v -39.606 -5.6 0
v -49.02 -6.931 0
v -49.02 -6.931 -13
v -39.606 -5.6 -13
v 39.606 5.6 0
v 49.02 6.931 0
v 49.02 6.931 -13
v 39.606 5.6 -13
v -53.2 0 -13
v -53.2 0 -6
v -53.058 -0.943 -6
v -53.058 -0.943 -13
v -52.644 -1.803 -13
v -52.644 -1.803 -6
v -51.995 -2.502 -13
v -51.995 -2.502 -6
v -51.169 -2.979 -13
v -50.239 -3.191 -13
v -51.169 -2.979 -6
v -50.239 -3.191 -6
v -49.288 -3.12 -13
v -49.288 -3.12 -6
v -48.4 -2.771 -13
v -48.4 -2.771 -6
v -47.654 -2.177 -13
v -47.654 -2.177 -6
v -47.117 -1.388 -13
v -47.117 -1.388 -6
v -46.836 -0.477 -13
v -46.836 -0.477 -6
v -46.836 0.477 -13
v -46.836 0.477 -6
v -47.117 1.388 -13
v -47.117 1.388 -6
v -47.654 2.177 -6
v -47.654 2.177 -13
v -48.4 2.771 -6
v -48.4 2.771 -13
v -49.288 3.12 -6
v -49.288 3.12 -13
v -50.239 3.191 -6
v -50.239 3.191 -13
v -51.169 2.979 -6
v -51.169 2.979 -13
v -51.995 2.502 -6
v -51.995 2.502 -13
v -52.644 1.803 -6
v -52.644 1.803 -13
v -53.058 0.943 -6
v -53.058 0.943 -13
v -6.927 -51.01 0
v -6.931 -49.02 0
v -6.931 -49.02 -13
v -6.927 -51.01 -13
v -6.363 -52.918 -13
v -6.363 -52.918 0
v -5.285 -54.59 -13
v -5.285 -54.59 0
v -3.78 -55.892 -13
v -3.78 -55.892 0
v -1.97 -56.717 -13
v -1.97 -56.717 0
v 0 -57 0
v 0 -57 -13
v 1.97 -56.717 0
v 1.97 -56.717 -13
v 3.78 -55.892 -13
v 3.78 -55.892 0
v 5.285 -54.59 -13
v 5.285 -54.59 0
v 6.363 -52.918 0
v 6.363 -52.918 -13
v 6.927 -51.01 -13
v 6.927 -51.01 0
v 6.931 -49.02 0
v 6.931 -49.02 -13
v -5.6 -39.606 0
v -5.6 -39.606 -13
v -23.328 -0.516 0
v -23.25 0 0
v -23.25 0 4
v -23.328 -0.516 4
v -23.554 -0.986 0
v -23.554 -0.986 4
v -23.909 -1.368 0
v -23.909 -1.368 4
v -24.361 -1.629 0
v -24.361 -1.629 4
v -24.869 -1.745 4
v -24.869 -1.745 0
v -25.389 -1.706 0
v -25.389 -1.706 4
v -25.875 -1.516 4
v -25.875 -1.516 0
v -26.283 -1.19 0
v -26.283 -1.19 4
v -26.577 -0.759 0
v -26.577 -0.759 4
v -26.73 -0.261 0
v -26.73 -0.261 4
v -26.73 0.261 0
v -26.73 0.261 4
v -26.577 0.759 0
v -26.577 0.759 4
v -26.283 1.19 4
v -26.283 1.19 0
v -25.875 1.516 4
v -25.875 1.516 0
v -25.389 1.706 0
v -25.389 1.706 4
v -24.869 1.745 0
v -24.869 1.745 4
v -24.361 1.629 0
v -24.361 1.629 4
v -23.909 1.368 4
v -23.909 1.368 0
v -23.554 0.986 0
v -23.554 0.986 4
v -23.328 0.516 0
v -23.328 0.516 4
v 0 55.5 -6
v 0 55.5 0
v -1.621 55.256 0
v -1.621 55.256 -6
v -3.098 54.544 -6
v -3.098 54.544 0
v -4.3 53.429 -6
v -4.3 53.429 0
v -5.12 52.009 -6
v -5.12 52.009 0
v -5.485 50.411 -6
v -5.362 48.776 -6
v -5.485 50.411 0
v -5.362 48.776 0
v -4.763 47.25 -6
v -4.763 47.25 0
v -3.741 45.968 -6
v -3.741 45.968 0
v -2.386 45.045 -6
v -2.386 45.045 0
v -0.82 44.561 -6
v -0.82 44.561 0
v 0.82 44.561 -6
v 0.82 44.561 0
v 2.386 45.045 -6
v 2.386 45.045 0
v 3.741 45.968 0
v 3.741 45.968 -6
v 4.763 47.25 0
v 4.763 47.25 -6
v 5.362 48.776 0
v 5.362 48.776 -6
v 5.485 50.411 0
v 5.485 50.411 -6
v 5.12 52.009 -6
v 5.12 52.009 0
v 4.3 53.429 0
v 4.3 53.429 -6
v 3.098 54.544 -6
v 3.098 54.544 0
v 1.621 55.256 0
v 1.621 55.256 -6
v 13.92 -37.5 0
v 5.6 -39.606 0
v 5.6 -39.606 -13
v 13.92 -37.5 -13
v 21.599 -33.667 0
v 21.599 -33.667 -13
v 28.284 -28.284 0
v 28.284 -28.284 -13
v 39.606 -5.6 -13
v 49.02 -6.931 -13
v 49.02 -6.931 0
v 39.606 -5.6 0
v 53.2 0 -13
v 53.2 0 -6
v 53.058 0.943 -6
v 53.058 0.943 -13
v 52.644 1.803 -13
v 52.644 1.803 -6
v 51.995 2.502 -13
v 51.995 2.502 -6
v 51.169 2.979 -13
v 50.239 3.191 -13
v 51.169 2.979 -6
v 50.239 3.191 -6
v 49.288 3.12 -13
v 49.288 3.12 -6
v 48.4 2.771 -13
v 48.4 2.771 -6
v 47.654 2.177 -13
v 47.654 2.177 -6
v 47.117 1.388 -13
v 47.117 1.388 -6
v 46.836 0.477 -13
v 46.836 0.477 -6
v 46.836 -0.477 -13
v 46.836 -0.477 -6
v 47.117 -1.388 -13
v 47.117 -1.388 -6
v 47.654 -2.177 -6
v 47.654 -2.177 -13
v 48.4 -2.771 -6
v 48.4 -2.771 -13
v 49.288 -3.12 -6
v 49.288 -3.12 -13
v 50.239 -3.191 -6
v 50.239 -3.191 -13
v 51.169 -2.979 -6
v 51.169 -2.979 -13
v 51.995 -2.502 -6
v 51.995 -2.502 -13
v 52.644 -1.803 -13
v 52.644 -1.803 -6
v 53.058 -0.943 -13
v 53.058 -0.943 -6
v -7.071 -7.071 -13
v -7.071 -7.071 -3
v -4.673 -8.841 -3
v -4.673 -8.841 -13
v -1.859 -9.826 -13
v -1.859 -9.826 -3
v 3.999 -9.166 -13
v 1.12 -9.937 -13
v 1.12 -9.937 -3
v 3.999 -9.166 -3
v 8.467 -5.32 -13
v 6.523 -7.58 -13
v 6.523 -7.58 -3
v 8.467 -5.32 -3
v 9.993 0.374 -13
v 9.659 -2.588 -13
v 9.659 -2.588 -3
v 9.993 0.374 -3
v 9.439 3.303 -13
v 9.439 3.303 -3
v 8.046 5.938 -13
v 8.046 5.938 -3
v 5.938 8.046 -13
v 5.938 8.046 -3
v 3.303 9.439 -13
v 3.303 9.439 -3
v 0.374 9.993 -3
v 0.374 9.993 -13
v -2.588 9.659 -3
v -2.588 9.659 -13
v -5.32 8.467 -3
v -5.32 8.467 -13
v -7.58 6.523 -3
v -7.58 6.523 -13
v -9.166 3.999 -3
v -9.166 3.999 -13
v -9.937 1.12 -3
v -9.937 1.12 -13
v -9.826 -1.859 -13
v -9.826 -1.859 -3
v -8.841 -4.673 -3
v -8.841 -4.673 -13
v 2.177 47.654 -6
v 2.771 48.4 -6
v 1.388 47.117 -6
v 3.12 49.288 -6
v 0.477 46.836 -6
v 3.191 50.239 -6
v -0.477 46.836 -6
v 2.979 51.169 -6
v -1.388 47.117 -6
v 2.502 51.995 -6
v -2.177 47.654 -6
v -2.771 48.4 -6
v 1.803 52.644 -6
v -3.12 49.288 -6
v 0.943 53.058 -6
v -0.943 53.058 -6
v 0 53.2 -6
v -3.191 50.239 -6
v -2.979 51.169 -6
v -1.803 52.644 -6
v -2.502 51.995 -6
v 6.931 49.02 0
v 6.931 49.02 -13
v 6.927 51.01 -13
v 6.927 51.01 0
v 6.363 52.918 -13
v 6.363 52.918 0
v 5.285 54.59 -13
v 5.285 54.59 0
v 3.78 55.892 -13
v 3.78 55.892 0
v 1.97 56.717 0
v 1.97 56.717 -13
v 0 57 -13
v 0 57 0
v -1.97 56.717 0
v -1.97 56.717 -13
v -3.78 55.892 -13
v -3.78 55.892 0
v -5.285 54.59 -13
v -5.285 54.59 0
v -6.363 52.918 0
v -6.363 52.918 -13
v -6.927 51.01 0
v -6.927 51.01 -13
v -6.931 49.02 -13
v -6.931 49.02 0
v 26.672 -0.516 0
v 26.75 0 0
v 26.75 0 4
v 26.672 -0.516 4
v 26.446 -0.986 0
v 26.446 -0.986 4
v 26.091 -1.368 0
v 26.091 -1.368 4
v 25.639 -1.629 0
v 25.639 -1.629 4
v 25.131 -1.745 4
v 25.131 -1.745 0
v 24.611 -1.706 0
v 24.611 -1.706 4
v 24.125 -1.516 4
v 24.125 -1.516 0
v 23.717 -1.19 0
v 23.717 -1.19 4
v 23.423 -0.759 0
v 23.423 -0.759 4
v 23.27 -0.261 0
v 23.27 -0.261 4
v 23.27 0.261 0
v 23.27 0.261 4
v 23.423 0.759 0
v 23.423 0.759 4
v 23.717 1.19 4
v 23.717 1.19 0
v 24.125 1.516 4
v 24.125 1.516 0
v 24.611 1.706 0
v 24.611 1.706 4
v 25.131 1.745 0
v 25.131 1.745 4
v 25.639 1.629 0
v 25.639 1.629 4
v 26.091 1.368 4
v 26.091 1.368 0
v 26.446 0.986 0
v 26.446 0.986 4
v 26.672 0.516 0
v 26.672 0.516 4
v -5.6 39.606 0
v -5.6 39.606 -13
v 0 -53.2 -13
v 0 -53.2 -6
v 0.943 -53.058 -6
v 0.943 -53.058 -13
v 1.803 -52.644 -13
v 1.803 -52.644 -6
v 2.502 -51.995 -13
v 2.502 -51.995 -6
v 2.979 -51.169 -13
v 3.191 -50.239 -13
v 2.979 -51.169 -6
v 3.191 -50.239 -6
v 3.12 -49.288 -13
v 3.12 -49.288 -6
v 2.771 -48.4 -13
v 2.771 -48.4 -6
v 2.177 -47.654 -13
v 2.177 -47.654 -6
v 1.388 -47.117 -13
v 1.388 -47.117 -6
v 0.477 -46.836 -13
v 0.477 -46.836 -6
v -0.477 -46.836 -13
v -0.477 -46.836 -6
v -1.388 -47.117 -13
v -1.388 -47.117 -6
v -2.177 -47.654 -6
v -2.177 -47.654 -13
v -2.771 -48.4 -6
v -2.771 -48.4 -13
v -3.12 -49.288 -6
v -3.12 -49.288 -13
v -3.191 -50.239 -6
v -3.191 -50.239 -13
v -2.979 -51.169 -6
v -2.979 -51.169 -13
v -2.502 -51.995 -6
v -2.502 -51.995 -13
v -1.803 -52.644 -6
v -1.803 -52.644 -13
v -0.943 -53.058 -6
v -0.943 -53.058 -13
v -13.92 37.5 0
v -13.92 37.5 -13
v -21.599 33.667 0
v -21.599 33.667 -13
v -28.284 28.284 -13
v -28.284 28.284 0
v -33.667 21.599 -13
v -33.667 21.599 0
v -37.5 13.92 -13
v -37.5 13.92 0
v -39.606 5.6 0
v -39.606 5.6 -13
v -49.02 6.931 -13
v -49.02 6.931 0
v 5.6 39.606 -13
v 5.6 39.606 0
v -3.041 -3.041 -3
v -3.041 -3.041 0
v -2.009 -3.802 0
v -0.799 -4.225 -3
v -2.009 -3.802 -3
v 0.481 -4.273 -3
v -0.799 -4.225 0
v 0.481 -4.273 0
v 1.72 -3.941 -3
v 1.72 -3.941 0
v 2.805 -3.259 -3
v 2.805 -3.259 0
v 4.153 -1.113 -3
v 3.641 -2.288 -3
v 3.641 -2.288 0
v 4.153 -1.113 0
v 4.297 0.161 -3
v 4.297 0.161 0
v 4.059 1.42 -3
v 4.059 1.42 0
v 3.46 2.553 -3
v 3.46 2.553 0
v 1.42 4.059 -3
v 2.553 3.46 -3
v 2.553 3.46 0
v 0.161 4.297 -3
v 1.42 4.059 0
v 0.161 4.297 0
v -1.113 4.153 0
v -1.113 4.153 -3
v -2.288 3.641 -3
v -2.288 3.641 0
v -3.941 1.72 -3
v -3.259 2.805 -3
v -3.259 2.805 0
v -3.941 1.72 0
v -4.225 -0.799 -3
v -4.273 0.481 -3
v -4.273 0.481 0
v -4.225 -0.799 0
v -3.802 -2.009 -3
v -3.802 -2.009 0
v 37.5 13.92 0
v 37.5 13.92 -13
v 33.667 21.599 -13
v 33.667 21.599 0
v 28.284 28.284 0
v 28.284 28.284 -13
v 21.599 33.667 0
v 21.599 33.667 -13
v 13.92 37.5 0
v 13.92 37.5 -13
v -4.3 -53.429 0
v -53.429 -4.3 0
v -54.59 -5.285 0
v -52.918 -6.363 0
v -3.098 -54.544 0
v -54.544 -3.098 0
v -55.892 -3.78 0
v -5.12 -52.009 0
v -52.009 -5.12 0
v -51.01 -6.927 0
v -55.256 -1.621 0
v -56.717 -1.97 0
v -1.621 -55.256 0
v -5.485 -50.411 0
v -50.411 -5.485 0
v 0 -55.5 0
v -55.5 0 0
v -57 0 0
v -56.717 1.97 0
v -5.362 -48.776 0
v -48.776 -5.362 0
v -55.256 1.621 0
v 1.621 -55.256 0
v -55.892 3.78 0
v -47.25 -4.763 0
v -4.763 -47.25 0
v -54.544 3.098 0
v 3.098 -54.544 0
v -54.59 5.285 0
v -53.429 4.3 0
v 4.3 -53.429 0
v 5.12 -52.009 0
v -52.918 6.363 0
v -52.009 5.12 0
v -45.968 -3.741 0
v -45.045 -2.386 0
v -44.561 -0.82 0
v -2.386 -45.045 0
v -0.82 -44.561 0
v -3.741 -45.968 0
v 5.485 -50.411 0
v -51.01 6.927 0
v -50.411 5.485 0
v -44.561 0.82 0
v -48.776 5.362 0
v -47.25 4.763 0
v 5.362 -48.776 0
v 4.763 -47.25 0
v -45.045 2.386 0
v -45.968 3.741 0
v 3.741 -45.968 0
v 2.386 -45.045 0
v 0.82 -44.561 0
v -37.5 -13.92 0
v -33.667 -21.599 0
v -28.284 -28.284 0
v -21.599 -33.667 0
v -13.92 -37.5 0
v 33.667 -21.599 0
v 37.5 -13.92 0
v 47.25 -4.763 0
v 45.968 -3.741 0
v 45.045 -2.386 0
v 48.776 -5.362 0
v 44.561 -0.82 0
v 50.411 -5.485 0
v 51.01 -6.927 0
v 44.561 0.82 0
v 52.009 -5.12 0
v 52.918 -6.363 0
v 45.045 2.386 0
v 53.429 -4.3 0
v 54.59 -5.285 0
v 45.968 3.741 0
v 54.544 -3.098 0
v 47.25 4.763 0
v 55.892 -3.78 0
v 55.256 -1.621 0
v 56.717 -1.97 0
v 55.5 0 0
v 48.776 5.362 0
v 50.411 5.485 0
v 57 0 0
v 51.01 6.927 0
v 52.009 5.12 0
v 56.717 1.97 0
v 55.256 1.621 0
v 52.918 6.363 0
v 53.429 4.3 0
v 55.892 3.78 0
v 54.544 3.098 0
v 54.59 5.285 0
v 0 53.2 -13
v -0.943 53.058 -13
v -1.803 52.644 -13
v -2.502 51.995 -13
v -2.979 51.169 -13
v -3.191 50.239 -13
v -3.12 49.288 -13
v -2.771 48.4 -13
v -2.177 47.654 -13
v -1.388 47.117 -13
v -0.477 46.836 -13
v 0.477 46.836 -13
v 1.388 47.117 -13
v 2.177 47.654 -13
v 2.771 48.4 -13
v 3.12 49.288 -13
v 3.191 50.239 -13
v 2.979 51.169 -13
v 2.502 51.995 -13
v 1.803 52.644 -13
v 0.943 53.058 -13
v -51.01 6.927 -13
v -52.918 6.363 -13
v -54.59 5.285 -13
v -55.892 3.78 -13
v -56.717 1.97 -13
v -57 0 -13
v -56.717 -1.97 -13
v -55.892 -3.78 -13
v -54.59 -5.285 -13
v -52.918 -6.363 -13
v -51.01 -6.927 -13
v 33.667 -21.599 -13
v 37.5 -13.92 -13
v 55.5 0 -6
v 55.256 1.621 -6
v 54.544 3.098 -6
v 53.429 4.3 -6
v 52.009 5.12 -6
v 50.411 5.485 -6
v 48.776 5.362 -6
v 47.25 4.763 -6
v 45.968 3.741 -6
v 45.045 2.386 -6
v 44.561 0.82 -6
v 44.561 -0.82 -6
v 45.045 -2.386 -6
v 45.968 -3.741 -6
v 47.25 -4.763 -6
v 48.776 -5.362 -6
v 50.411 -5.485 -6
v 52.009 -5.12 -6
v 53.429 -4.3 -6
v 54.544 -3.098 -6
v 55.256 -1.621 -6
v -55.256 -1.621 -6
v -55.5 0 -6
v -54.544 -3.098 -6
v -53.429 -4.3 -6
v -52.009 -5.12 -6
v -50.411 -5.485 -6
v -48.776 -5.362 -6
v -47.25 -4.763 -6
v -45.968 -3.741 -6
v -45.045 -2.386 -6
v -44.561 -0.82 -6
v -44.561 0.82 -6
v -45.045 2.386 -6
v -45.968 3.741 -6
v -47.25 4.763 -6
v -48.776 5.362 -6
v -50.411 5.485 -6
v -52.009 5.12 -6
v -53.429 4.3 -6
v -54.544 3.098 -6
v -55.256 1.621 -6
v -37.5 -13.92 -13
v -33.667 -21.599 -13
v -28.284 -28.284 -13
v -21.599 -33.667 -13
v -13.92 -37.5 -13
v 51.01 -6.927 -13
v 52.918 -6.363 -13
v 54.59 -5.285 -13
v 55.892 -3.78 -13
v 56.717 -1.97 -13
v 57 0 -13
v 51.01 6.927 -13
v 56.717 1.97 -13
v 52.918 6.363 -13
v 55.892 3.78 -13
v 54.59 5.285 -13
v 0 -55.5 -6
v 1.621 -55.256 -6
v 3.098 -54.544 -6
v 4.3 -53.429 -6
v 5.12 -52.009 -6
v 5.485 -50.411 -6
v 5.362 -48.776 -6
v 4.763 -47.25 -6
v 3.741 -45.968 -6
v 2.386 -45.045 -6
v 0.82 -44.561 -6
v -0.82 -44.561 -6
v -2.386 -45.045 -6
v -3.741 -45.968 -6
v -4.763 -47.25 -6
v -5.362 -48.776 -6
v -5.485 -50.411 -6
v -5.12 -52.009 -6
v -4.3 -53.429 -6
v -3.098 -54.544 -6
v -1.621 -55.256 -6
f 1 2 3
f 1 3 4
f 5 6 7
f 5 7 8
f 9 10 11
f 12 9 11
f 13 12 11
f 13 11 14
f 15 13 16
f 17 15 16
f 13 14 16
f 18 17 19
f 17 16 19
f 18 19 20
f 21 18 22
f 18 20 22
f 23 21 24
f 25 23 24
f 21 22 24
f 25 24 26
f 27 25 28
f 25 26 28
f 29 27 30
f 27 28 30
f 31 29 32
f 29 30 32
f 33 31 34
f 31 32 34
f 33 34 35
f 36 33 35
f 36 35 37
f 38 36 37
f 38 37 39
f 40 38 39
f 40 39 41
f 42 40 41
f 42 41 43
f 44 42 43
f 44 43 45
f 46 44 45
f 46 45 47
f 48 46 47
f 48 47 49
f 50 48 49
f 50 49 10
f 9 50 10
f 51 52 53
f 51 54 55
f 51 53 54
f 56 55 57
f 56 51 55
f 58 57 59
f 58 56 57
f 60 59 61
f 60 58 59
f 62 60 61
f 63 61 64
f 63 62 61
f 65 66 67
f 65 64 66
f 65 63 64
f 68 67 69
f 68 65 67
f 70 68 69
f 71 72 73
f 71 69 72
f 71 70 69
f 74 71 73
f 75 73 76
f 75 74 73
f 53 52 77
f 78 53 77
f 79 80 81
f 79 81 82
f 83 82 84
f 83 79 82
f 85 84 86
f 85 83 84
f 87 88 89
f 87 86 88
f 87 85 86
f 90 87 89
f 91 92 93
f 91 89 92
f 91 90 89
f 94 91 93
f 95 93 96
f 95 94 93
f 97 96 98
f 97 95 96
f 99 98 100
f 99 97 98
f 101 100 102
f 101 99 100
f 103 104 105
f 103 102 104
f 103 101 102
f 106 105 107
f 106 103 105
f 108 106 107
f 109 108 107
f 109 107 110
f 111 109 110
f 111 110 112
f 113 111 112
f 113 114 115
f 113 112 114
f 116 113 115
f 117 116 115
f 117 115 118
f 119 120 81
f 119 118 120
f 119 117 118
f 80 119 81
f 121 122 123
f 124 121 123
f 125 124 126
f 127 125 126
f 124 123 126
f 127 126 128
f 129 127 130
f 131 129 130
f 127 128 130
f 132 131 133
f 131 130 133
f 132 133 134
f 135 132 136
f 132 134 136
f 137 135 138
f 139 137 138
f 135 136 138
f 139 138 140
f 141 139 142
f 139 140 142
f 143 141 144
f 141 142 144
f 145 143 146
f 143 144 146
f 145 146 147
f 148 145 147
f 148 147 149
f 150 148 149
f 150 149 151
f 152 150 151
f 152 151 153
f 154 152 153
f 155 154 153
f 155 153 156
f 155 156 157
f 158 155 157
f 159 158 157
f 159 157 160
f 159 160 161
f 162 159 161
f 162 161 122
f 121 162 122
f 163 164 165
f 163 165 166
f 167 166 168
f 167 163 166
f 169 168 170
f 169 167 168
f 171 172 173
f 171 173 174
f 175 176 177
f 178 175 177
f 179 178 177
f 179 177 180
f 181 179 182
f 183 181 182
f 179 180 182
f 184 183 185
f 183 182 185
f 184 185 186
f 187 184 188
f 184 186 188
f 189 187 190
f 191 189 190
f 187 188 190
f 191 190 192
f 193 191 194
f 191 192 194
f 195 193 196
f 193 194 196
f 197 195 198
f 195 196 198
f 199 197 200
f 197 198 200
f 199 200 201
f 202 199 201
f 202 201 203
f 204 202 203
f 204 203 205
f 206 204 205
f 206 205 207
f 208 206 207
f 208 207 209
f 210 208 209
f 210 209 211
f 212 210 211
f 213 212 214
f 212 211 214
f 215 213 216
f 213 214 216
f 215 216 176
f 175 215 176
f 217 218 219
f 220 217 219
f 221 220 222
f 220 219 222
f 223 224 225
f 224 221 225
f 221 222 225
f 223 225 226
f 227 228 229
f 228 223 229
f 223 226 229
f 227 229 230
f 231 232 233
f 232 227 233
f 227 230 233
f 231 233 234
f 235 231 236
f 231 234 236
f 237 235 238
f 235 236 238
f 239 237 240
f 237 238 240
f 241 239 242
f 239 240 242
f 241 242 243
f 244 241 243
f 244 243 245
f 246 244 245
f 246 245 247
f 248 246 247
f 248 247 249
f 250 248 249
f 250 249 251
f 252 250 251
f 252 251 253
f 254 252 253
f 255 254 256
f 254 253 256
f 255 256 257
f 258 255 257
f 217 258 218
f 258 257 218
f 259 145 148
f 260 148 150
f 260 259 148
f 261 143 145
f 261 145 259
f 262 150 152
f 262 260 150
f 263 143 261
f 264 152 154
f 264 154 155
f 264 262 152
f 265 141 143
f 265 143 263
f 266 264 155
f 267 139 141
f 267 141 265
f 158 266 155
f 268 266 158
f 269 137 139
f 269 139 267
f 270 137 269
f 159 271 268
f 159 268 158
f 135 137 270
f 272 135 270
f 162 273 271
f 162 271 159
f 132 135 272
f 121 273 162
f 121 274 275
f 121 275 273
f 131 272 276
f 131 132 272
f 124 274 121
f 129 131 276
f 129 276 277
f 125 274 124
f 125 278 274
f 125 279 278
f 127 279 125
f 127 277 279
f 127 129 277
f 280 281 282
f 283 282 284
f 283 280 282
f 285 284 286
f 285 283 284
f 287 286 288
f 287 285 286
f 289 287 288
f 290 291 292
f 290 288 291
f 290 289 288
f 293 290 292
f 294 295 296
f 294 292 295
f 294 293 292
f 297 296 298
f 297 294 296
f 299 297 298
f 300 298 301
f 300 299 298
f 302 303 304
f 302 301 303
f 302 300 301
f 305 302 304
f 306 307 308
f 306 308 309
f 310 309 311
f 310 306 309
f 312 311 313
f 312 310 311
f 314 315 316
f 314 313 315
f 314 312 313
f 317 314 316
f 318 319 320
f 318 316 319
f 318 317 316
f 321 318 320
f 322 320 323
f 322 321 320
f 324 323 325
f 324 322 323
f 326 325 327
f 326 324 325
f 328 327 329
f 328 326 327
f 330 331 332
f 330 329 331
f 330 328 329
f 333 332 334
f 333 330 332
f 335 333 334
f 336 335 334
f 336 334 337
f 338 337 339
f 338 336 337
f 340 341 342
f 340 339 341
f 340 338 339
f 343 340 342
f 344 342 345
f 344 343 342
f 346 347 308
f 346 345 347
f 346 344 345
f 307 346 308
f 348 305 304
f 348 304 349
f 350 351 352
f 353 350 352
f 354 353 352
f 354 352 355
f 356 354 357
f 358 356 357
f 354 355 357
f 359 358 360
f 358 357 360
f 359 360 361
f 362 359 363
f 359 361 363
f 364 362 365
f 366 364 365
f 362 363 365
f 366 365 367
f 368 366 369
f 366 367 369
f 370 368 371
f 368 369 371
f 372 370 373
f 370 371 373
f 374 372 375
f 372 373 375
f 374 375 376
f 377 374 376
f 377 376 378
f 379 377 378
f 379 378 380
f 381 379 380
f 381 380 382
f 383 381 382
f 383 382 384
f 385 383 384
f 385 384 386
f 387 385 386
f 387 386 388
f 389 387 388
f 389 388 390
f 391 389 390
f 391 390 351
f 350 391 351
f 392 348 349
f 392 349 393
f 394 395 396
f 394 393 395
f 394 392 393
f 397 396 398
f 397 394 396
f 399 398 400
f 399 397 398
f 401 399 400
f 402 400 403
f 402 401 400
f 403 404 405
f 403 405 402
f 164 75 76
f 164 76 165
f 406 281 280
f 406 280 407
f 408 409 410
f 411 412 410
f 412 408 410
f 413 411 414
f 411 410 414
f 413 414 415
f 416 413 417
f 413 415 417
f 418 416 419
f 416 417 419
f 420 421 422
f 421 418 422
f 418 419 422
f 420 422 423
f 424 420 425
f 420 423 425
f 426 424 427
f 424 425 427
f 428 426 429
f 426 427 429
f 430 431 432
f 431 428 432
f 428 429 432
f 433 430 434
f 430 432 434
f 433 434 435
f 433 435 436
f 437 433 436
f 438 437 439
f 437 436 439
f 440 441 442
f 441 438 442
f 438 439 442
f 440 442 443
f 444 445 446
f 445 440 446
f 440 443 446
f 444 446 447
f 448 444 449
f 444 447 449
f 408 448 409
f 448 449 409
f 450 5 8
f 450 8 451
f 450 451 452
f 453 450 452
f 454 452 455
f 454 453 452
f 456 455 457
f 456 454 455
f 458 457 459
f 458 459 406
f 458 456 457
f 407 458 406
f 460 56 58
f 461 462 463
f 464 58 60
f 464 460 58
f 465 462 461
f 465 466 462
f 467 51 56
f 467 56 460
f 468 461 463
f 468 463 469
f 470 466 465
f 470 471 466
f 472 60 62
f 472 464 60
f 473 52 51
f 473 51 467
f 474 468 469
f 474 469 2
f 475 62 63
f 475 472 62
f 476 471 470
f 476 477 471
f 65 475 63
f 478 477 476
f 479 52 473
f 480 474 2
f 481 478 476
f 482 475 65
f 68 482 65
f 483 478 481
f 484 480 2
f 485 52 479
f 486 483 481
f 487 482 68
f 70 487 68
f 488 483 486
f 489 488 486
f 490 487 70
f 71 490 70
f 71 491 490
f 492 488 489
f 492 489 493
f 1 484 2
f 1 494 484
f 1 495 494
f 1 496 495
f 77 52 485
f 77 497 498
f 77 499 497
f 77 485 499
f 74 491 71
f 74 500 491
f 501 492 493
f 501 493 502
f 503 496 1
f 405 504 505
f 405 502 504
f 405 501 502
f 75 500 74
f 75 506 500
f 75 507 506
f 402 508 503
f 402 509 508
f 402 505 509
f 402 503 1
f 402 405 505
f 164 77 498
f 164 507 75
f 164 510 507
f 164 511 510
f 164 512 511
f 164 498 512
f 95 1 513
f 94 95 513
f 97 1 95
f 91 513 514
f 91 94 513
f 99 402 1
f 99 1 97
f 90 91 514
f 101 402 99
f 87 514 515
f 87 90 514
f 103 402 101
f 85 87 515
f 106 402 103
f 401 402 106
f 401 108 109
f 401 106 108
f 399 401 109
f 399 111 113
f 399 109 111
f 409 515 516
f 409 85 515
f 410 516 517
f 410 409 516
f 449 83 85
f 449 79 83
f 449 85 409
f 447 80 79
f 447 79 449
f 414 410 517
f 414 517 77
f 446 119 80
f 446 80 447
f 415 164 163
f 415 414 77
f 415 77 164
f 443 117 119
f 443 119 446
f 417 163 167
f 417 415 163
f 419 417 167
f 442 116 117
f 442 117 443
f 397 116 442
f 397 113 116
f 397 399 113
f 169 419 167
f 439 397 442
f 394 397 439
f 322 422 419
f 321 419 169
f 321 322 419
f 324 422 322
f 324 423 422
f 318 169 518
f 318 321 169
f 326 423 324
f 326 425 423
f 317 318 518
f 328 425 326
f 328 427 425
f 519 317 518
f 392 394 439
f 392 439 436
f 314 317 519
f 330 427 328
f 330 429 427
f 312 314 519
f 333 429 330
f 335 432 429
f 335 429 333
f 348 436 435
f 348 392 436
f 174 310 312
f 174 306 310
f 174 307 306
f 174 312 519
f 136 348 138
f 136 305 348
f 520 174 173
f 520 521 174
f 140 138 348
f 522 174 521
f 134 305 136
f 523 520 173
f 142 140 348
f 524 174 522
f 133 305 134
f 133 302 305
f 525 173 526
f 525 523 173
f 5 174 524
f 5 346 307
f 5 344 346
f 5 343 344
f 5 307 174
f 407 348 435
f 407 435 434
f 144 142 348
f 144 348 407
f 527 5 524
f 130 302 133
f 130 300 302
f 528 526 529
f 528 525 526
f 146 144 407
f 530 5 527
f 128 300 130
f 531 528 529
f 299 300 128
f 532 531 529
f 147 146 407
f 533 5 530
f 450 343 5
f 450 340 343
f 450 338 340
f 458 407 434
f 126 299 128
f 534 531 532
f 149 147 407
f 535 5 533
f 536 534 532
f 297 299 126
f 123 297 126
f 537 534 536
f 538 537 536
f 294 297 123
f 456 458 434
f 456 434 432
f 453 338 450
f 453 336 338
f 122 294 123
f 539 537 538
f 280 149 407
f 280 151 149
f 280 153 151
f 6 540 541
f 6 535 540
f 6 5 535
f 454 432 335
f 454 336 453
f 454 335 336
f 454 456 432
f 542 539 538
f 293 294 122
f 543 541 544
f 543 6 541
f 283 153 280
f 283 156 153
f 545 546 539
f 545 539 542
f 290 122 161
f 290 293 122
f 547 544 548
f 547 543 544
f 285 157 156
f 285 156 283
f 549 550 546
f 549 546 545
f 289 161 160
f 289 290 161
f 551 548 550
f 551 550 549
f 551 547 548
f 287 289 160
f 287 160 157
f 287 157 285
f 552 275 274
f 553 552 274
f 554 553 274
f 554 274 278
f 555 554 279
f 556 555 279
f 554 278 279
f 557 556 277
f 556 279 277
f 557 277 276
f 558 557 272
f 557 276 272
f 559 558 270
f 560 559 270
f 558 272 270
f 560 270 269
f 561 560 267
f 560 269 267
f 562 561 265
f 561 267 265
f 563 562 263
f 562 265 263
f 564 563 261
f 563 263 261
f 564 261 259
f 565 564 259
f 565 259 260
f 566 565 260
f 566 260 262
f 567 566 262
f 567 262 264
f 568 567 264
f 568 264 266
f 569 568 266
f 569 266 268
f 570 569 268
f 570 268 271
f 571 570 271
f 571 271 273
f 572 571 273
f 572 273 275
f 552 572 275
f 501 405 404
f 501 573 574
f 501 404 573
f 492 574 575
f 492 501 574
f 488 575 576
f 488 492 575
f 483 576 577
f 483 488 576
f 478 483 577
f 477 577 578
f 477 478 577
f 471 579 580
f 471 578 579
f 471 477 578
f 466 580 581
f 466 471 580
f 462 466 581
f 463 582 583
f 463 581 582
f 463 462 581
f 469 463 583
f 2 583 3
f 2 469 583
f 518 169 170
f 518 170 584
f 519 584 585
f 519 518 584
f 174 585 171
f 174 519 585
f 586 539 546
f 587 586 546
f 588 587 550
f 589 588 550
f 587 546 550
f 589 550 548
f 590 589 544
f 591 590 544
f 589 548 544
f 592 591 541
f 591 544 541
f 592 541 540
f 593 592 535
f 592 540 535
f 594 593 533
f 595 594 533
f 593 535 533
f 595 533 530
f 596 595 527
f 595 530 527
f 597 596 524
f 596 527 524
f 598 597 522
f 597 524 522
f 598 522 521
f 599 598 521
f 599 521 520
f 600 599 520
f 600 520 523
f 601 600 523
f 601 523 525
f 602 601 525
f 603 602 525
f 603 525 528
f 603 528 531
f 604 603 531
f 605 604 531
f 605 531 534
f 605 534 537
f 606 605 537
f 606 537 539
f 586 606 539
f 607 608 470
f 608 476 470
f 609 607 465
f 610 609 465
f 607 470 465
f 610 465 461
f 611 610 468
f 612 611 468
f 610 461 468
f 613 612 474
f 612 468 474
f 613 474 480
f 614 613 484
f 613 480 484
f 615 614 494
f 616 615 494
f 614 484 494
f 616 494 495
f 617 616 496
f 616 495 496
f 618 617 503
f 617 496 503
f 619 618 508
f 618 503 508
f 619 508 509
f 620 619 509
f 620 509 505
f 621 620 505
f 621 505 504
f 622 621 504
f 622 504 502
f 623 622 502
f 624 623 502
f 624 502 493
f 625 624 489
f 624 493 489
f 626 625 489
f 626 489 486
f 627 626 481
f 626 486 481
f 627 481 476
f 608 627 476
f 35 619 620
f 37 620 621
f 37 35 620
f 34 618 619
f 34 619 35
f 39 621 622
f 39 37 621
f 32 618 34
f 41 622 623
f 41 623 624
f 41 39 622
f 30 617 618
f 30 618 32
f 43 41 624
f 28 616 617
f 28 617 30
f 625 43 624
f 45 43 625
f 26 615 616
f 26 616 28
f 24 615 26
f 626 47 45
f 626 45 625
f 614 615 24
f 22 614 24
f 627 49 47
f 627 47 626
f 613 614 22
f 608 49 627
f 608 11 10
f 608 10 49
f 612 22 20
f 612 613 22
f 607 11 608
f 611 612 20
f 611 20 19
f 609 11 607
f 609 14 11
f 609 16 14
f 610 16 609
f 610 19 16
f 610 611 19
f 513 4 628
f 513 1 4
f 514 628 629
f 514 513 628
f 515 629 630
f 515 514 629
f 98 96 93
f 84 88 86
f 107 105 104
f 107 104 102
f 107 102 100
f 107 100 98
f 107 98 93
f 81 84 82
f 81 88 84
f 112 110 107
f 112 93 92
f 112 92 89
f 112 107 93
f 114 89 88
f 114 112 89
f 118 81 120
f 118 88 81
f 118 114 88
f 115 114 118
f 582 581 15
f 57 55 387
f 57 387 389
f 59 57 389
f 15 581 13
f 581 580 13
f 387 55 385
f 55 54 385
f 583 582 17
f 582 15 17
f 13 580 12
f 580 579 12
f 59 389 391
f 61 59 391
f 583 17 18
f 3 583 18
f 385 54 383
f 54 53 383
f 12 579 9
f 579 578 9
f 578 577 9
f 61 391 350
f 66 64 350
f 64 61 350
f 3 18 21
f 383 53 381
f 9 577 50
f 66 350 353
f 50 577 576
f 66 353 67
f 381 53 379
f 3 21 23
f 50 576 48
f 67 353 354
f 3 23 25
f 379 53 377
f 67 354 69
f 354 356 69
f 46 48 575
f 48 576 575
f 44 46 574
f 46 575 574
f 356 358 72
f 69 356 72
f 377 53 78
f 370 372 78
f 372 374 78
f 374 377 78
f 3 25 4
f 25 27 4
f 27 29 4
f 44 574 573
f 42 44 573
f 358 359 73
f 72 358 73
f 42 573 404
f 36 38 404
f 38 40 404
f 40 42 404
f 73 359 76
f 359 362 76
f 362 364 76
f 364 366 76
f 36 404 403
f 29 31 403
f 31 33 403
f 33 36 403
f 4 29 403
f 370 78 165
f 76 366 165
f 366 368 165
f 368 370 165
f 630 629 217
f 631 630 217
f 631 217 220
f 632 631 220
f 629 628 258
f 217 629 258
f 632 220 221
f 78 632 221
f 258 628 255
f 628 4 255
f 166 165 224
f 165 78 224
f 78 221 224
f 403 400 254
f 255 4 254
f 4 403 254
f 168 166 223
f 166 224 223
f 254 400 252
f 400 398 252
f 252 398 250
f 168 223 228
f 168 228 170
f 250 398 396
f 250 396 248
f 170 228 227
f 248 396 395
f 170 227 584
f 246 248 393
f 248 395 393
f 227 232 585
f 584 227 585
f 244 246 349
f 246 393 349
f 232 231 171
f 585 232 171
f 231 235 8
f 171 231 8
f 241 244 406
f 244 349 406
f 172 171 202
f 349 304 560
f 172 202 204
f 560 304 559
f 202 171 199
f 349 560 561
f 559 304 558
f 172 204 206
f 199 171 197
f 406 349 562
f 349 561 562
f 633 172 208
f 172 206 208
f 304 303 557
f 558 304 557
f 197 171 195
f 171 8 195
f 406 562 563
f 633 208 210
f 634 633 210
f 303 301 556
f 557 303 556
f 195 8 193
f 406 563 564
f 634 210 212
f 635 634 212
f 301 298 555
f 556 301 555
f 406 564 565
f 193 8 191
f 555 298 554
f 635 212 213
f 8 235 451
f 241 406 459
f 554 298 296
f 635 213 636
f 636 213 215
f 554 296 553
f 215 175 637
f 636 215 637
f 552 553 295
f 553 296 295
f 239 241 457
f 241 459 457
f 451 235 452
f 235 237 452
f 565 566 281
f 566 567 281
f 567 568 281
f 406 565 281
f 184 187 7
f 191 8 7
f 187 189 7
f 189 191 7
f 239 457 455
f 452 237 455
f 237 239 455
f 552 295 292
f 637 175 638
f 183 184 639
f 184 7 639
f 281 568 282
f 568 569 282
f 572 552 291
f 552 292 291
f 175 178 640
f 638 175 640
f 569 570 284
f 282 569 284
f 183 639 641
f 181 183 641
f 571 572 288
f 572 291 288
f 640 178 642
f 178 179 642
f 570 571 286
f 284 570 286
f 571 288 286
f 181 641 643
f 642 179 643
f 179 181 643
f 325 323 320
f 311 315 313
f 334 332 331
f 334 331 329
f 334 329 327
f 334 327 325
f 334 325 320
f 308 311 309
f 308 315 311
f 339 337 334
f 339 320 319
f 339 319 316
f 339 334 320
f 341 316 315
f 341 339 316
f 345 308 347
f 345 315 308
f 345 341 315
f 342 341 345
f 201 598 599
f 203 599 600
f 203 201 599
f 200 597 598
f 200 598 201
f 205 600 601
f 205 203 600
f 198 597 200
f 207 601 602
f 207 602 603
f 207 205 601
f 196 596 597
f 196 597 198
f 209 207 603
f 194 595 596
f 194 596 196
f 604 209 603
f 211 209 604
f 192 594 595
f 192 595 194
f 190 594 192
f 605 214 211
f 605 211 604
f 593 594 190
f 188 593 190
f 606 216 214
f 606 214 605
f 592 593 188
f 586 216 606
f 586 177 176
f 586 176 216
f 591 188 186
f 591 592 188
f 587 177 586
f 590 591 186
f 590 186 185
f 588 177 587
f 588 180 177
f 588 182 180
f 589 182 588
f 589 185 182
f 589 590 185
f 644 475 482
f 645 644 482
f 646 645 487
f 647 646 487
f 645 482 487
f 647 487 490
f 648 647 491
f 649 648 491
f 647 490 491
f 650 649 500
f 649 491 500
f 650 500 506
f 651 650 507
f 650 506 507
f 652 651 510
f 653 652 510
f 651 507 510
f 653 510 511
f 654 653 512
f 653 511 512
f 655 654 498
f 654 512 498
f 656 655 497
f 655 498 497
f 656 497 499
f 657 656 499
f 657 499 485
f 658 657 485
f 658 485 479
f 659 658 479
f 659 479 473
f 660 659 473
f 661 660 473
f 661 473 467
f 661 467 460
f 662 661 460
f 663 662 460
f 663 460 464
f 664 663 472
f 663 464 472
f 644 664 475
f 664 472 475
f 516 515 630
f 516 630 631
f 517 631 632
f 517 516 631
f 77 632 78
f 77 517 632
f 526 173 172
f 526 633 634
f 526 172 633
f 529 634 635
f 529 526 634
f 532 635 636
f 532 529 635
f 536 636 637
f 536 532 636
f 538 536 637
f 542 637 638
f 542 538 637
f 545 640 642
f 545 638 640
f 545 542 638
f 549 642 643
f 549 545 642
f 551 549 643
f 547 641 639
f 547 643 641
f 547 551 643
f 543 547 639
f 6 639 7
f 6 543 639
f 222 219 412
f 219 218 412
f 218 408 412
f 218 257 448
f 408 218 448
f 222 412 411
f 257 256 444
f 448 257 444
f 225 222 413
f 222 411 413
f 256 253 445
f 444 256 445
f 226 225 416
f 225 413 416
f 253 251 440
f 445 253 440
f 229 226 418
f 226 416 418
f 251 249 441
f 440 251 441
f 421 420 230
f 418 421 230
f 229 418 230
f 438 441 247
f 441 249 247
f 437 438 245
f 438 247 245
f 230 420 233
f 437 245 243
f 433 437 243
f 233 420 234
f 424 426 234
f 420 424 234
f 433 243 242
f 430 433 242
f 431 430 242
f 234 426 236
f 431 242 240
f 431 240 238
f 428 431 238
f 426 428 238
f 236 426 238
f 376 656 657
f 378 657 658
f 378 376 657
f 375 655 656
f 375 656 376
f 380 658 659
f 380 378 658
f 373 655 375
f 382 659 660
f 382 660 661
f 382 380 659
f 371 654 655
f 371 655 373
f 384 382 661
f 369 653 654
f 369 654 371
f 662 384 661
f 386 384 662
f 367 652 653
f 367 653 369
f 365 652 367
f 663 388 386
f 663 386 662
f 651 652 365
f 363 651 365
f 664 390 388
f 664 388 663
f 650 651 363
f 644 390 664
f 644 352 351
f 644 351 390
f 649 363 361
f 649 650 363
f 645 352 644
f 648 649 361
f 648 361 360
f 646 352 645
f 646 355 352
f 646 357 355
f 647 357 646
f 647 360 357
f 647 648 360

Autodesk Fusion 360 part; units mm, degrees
sketch "Base" plane through (0, 0, 0) normal (0, 0, 1) x (1, 0, 0)
  circle A0 centre (0, 0) radius 40
  circle A1 centre (0, 0) radius 4.3
  line L0 (0, 0) -> (50, 0) construction
  circle A2 centre (25, 0) radius 1.75
  line L1 (0, 0) -> (0, 40) construction
  circle A3 centre (-25, 0) radius 1.75
  circle A4 centre (50, 0) radius 3.2
  circle A5 centre (0, 0) radius 10
  line L2 (7.0711, -7.0711) -> (28.2843, -28.2843)
  line L3 (7.0711, -7.0711) -> (0, 0) construction
  line L4 (7.0711, 7.0711) -> (3.0406, 3.0406)
  line L5 (7.0711, -7.0711) -> (3.0406, -3.0406)
  line L6 (7.0711, 7.0711) -> (28.2843, 28.2843)
  circle A6 centre (50, 0) radius 7
  line L7 (49.02, 6.9311) -> (39.6061, 5.6)
  line L8 (39.6061, 5.6) -> (0, 0) construction
  line L9 (49.02, -6.9311) -> (39.6061, -5.6)
  circle A7 centre (50, 0) radius 5.5
  dimension "d1" = 80
  dimension "d4" = 8.6
  dimension "d8" = 25
  dimension "d9" = 3.5
  dimension "d13" = 6.4
  dimension "d21" = 20
  dimension "d49" = 14
  dimension "d50" = 45
  dimension "d51" = 50
  dimension "d52" = 11
extrude "Extrude1" add sketch "Base" against normal blind 13 contours A0 A5 L2 L6 | A0 A6 L7 L9 | A6 | A2 | A7 picked at (21.3272, -10.7092) makes body 1
extrude "Extrude6" add sketch "Base" against normal blind 3 contours A1 A5 L4 L5 picked at (8.0592, -0.6222) bodies 1
extrude "Extrude7" cut sketch "Base" against normal blind 6 contours A7 bodies 1
pattern_circular "C-Pattern2" count 4 over 360 about axis through (0, 0, 1.75) along (0, 0, 1) of bodies 1 makes body 2 at (0.1023, 27.8337, 0) makes body 3 at (-27.8337, 0.1023, 0) makes body 4 at (-0.1023, -27.8337, 0)
extrude "Extrude5" add sketch "Base" along normal blind 4 separate body contours A2 | A3 makes body 5 at (26.7478, -0.0872, 2.6667) makes body 6 at (-23.2522, -0.0872, 2.6667)
combine "Combine1" operation add target body 1 tool bodies 6 5 2 3 4
copy_body "Body->Comp1" bodies 1 removing the originals makes body 7 in component "Mirror_Pyramid_Mount"
component "Mirror_Pyramid_Mount" placed x (1, 0, 0) y (0, 1, 0) z (0, 0, 1) at (0, 0, 0)
equation "d51 = ( 2 * 25 ) * 1 mm"
